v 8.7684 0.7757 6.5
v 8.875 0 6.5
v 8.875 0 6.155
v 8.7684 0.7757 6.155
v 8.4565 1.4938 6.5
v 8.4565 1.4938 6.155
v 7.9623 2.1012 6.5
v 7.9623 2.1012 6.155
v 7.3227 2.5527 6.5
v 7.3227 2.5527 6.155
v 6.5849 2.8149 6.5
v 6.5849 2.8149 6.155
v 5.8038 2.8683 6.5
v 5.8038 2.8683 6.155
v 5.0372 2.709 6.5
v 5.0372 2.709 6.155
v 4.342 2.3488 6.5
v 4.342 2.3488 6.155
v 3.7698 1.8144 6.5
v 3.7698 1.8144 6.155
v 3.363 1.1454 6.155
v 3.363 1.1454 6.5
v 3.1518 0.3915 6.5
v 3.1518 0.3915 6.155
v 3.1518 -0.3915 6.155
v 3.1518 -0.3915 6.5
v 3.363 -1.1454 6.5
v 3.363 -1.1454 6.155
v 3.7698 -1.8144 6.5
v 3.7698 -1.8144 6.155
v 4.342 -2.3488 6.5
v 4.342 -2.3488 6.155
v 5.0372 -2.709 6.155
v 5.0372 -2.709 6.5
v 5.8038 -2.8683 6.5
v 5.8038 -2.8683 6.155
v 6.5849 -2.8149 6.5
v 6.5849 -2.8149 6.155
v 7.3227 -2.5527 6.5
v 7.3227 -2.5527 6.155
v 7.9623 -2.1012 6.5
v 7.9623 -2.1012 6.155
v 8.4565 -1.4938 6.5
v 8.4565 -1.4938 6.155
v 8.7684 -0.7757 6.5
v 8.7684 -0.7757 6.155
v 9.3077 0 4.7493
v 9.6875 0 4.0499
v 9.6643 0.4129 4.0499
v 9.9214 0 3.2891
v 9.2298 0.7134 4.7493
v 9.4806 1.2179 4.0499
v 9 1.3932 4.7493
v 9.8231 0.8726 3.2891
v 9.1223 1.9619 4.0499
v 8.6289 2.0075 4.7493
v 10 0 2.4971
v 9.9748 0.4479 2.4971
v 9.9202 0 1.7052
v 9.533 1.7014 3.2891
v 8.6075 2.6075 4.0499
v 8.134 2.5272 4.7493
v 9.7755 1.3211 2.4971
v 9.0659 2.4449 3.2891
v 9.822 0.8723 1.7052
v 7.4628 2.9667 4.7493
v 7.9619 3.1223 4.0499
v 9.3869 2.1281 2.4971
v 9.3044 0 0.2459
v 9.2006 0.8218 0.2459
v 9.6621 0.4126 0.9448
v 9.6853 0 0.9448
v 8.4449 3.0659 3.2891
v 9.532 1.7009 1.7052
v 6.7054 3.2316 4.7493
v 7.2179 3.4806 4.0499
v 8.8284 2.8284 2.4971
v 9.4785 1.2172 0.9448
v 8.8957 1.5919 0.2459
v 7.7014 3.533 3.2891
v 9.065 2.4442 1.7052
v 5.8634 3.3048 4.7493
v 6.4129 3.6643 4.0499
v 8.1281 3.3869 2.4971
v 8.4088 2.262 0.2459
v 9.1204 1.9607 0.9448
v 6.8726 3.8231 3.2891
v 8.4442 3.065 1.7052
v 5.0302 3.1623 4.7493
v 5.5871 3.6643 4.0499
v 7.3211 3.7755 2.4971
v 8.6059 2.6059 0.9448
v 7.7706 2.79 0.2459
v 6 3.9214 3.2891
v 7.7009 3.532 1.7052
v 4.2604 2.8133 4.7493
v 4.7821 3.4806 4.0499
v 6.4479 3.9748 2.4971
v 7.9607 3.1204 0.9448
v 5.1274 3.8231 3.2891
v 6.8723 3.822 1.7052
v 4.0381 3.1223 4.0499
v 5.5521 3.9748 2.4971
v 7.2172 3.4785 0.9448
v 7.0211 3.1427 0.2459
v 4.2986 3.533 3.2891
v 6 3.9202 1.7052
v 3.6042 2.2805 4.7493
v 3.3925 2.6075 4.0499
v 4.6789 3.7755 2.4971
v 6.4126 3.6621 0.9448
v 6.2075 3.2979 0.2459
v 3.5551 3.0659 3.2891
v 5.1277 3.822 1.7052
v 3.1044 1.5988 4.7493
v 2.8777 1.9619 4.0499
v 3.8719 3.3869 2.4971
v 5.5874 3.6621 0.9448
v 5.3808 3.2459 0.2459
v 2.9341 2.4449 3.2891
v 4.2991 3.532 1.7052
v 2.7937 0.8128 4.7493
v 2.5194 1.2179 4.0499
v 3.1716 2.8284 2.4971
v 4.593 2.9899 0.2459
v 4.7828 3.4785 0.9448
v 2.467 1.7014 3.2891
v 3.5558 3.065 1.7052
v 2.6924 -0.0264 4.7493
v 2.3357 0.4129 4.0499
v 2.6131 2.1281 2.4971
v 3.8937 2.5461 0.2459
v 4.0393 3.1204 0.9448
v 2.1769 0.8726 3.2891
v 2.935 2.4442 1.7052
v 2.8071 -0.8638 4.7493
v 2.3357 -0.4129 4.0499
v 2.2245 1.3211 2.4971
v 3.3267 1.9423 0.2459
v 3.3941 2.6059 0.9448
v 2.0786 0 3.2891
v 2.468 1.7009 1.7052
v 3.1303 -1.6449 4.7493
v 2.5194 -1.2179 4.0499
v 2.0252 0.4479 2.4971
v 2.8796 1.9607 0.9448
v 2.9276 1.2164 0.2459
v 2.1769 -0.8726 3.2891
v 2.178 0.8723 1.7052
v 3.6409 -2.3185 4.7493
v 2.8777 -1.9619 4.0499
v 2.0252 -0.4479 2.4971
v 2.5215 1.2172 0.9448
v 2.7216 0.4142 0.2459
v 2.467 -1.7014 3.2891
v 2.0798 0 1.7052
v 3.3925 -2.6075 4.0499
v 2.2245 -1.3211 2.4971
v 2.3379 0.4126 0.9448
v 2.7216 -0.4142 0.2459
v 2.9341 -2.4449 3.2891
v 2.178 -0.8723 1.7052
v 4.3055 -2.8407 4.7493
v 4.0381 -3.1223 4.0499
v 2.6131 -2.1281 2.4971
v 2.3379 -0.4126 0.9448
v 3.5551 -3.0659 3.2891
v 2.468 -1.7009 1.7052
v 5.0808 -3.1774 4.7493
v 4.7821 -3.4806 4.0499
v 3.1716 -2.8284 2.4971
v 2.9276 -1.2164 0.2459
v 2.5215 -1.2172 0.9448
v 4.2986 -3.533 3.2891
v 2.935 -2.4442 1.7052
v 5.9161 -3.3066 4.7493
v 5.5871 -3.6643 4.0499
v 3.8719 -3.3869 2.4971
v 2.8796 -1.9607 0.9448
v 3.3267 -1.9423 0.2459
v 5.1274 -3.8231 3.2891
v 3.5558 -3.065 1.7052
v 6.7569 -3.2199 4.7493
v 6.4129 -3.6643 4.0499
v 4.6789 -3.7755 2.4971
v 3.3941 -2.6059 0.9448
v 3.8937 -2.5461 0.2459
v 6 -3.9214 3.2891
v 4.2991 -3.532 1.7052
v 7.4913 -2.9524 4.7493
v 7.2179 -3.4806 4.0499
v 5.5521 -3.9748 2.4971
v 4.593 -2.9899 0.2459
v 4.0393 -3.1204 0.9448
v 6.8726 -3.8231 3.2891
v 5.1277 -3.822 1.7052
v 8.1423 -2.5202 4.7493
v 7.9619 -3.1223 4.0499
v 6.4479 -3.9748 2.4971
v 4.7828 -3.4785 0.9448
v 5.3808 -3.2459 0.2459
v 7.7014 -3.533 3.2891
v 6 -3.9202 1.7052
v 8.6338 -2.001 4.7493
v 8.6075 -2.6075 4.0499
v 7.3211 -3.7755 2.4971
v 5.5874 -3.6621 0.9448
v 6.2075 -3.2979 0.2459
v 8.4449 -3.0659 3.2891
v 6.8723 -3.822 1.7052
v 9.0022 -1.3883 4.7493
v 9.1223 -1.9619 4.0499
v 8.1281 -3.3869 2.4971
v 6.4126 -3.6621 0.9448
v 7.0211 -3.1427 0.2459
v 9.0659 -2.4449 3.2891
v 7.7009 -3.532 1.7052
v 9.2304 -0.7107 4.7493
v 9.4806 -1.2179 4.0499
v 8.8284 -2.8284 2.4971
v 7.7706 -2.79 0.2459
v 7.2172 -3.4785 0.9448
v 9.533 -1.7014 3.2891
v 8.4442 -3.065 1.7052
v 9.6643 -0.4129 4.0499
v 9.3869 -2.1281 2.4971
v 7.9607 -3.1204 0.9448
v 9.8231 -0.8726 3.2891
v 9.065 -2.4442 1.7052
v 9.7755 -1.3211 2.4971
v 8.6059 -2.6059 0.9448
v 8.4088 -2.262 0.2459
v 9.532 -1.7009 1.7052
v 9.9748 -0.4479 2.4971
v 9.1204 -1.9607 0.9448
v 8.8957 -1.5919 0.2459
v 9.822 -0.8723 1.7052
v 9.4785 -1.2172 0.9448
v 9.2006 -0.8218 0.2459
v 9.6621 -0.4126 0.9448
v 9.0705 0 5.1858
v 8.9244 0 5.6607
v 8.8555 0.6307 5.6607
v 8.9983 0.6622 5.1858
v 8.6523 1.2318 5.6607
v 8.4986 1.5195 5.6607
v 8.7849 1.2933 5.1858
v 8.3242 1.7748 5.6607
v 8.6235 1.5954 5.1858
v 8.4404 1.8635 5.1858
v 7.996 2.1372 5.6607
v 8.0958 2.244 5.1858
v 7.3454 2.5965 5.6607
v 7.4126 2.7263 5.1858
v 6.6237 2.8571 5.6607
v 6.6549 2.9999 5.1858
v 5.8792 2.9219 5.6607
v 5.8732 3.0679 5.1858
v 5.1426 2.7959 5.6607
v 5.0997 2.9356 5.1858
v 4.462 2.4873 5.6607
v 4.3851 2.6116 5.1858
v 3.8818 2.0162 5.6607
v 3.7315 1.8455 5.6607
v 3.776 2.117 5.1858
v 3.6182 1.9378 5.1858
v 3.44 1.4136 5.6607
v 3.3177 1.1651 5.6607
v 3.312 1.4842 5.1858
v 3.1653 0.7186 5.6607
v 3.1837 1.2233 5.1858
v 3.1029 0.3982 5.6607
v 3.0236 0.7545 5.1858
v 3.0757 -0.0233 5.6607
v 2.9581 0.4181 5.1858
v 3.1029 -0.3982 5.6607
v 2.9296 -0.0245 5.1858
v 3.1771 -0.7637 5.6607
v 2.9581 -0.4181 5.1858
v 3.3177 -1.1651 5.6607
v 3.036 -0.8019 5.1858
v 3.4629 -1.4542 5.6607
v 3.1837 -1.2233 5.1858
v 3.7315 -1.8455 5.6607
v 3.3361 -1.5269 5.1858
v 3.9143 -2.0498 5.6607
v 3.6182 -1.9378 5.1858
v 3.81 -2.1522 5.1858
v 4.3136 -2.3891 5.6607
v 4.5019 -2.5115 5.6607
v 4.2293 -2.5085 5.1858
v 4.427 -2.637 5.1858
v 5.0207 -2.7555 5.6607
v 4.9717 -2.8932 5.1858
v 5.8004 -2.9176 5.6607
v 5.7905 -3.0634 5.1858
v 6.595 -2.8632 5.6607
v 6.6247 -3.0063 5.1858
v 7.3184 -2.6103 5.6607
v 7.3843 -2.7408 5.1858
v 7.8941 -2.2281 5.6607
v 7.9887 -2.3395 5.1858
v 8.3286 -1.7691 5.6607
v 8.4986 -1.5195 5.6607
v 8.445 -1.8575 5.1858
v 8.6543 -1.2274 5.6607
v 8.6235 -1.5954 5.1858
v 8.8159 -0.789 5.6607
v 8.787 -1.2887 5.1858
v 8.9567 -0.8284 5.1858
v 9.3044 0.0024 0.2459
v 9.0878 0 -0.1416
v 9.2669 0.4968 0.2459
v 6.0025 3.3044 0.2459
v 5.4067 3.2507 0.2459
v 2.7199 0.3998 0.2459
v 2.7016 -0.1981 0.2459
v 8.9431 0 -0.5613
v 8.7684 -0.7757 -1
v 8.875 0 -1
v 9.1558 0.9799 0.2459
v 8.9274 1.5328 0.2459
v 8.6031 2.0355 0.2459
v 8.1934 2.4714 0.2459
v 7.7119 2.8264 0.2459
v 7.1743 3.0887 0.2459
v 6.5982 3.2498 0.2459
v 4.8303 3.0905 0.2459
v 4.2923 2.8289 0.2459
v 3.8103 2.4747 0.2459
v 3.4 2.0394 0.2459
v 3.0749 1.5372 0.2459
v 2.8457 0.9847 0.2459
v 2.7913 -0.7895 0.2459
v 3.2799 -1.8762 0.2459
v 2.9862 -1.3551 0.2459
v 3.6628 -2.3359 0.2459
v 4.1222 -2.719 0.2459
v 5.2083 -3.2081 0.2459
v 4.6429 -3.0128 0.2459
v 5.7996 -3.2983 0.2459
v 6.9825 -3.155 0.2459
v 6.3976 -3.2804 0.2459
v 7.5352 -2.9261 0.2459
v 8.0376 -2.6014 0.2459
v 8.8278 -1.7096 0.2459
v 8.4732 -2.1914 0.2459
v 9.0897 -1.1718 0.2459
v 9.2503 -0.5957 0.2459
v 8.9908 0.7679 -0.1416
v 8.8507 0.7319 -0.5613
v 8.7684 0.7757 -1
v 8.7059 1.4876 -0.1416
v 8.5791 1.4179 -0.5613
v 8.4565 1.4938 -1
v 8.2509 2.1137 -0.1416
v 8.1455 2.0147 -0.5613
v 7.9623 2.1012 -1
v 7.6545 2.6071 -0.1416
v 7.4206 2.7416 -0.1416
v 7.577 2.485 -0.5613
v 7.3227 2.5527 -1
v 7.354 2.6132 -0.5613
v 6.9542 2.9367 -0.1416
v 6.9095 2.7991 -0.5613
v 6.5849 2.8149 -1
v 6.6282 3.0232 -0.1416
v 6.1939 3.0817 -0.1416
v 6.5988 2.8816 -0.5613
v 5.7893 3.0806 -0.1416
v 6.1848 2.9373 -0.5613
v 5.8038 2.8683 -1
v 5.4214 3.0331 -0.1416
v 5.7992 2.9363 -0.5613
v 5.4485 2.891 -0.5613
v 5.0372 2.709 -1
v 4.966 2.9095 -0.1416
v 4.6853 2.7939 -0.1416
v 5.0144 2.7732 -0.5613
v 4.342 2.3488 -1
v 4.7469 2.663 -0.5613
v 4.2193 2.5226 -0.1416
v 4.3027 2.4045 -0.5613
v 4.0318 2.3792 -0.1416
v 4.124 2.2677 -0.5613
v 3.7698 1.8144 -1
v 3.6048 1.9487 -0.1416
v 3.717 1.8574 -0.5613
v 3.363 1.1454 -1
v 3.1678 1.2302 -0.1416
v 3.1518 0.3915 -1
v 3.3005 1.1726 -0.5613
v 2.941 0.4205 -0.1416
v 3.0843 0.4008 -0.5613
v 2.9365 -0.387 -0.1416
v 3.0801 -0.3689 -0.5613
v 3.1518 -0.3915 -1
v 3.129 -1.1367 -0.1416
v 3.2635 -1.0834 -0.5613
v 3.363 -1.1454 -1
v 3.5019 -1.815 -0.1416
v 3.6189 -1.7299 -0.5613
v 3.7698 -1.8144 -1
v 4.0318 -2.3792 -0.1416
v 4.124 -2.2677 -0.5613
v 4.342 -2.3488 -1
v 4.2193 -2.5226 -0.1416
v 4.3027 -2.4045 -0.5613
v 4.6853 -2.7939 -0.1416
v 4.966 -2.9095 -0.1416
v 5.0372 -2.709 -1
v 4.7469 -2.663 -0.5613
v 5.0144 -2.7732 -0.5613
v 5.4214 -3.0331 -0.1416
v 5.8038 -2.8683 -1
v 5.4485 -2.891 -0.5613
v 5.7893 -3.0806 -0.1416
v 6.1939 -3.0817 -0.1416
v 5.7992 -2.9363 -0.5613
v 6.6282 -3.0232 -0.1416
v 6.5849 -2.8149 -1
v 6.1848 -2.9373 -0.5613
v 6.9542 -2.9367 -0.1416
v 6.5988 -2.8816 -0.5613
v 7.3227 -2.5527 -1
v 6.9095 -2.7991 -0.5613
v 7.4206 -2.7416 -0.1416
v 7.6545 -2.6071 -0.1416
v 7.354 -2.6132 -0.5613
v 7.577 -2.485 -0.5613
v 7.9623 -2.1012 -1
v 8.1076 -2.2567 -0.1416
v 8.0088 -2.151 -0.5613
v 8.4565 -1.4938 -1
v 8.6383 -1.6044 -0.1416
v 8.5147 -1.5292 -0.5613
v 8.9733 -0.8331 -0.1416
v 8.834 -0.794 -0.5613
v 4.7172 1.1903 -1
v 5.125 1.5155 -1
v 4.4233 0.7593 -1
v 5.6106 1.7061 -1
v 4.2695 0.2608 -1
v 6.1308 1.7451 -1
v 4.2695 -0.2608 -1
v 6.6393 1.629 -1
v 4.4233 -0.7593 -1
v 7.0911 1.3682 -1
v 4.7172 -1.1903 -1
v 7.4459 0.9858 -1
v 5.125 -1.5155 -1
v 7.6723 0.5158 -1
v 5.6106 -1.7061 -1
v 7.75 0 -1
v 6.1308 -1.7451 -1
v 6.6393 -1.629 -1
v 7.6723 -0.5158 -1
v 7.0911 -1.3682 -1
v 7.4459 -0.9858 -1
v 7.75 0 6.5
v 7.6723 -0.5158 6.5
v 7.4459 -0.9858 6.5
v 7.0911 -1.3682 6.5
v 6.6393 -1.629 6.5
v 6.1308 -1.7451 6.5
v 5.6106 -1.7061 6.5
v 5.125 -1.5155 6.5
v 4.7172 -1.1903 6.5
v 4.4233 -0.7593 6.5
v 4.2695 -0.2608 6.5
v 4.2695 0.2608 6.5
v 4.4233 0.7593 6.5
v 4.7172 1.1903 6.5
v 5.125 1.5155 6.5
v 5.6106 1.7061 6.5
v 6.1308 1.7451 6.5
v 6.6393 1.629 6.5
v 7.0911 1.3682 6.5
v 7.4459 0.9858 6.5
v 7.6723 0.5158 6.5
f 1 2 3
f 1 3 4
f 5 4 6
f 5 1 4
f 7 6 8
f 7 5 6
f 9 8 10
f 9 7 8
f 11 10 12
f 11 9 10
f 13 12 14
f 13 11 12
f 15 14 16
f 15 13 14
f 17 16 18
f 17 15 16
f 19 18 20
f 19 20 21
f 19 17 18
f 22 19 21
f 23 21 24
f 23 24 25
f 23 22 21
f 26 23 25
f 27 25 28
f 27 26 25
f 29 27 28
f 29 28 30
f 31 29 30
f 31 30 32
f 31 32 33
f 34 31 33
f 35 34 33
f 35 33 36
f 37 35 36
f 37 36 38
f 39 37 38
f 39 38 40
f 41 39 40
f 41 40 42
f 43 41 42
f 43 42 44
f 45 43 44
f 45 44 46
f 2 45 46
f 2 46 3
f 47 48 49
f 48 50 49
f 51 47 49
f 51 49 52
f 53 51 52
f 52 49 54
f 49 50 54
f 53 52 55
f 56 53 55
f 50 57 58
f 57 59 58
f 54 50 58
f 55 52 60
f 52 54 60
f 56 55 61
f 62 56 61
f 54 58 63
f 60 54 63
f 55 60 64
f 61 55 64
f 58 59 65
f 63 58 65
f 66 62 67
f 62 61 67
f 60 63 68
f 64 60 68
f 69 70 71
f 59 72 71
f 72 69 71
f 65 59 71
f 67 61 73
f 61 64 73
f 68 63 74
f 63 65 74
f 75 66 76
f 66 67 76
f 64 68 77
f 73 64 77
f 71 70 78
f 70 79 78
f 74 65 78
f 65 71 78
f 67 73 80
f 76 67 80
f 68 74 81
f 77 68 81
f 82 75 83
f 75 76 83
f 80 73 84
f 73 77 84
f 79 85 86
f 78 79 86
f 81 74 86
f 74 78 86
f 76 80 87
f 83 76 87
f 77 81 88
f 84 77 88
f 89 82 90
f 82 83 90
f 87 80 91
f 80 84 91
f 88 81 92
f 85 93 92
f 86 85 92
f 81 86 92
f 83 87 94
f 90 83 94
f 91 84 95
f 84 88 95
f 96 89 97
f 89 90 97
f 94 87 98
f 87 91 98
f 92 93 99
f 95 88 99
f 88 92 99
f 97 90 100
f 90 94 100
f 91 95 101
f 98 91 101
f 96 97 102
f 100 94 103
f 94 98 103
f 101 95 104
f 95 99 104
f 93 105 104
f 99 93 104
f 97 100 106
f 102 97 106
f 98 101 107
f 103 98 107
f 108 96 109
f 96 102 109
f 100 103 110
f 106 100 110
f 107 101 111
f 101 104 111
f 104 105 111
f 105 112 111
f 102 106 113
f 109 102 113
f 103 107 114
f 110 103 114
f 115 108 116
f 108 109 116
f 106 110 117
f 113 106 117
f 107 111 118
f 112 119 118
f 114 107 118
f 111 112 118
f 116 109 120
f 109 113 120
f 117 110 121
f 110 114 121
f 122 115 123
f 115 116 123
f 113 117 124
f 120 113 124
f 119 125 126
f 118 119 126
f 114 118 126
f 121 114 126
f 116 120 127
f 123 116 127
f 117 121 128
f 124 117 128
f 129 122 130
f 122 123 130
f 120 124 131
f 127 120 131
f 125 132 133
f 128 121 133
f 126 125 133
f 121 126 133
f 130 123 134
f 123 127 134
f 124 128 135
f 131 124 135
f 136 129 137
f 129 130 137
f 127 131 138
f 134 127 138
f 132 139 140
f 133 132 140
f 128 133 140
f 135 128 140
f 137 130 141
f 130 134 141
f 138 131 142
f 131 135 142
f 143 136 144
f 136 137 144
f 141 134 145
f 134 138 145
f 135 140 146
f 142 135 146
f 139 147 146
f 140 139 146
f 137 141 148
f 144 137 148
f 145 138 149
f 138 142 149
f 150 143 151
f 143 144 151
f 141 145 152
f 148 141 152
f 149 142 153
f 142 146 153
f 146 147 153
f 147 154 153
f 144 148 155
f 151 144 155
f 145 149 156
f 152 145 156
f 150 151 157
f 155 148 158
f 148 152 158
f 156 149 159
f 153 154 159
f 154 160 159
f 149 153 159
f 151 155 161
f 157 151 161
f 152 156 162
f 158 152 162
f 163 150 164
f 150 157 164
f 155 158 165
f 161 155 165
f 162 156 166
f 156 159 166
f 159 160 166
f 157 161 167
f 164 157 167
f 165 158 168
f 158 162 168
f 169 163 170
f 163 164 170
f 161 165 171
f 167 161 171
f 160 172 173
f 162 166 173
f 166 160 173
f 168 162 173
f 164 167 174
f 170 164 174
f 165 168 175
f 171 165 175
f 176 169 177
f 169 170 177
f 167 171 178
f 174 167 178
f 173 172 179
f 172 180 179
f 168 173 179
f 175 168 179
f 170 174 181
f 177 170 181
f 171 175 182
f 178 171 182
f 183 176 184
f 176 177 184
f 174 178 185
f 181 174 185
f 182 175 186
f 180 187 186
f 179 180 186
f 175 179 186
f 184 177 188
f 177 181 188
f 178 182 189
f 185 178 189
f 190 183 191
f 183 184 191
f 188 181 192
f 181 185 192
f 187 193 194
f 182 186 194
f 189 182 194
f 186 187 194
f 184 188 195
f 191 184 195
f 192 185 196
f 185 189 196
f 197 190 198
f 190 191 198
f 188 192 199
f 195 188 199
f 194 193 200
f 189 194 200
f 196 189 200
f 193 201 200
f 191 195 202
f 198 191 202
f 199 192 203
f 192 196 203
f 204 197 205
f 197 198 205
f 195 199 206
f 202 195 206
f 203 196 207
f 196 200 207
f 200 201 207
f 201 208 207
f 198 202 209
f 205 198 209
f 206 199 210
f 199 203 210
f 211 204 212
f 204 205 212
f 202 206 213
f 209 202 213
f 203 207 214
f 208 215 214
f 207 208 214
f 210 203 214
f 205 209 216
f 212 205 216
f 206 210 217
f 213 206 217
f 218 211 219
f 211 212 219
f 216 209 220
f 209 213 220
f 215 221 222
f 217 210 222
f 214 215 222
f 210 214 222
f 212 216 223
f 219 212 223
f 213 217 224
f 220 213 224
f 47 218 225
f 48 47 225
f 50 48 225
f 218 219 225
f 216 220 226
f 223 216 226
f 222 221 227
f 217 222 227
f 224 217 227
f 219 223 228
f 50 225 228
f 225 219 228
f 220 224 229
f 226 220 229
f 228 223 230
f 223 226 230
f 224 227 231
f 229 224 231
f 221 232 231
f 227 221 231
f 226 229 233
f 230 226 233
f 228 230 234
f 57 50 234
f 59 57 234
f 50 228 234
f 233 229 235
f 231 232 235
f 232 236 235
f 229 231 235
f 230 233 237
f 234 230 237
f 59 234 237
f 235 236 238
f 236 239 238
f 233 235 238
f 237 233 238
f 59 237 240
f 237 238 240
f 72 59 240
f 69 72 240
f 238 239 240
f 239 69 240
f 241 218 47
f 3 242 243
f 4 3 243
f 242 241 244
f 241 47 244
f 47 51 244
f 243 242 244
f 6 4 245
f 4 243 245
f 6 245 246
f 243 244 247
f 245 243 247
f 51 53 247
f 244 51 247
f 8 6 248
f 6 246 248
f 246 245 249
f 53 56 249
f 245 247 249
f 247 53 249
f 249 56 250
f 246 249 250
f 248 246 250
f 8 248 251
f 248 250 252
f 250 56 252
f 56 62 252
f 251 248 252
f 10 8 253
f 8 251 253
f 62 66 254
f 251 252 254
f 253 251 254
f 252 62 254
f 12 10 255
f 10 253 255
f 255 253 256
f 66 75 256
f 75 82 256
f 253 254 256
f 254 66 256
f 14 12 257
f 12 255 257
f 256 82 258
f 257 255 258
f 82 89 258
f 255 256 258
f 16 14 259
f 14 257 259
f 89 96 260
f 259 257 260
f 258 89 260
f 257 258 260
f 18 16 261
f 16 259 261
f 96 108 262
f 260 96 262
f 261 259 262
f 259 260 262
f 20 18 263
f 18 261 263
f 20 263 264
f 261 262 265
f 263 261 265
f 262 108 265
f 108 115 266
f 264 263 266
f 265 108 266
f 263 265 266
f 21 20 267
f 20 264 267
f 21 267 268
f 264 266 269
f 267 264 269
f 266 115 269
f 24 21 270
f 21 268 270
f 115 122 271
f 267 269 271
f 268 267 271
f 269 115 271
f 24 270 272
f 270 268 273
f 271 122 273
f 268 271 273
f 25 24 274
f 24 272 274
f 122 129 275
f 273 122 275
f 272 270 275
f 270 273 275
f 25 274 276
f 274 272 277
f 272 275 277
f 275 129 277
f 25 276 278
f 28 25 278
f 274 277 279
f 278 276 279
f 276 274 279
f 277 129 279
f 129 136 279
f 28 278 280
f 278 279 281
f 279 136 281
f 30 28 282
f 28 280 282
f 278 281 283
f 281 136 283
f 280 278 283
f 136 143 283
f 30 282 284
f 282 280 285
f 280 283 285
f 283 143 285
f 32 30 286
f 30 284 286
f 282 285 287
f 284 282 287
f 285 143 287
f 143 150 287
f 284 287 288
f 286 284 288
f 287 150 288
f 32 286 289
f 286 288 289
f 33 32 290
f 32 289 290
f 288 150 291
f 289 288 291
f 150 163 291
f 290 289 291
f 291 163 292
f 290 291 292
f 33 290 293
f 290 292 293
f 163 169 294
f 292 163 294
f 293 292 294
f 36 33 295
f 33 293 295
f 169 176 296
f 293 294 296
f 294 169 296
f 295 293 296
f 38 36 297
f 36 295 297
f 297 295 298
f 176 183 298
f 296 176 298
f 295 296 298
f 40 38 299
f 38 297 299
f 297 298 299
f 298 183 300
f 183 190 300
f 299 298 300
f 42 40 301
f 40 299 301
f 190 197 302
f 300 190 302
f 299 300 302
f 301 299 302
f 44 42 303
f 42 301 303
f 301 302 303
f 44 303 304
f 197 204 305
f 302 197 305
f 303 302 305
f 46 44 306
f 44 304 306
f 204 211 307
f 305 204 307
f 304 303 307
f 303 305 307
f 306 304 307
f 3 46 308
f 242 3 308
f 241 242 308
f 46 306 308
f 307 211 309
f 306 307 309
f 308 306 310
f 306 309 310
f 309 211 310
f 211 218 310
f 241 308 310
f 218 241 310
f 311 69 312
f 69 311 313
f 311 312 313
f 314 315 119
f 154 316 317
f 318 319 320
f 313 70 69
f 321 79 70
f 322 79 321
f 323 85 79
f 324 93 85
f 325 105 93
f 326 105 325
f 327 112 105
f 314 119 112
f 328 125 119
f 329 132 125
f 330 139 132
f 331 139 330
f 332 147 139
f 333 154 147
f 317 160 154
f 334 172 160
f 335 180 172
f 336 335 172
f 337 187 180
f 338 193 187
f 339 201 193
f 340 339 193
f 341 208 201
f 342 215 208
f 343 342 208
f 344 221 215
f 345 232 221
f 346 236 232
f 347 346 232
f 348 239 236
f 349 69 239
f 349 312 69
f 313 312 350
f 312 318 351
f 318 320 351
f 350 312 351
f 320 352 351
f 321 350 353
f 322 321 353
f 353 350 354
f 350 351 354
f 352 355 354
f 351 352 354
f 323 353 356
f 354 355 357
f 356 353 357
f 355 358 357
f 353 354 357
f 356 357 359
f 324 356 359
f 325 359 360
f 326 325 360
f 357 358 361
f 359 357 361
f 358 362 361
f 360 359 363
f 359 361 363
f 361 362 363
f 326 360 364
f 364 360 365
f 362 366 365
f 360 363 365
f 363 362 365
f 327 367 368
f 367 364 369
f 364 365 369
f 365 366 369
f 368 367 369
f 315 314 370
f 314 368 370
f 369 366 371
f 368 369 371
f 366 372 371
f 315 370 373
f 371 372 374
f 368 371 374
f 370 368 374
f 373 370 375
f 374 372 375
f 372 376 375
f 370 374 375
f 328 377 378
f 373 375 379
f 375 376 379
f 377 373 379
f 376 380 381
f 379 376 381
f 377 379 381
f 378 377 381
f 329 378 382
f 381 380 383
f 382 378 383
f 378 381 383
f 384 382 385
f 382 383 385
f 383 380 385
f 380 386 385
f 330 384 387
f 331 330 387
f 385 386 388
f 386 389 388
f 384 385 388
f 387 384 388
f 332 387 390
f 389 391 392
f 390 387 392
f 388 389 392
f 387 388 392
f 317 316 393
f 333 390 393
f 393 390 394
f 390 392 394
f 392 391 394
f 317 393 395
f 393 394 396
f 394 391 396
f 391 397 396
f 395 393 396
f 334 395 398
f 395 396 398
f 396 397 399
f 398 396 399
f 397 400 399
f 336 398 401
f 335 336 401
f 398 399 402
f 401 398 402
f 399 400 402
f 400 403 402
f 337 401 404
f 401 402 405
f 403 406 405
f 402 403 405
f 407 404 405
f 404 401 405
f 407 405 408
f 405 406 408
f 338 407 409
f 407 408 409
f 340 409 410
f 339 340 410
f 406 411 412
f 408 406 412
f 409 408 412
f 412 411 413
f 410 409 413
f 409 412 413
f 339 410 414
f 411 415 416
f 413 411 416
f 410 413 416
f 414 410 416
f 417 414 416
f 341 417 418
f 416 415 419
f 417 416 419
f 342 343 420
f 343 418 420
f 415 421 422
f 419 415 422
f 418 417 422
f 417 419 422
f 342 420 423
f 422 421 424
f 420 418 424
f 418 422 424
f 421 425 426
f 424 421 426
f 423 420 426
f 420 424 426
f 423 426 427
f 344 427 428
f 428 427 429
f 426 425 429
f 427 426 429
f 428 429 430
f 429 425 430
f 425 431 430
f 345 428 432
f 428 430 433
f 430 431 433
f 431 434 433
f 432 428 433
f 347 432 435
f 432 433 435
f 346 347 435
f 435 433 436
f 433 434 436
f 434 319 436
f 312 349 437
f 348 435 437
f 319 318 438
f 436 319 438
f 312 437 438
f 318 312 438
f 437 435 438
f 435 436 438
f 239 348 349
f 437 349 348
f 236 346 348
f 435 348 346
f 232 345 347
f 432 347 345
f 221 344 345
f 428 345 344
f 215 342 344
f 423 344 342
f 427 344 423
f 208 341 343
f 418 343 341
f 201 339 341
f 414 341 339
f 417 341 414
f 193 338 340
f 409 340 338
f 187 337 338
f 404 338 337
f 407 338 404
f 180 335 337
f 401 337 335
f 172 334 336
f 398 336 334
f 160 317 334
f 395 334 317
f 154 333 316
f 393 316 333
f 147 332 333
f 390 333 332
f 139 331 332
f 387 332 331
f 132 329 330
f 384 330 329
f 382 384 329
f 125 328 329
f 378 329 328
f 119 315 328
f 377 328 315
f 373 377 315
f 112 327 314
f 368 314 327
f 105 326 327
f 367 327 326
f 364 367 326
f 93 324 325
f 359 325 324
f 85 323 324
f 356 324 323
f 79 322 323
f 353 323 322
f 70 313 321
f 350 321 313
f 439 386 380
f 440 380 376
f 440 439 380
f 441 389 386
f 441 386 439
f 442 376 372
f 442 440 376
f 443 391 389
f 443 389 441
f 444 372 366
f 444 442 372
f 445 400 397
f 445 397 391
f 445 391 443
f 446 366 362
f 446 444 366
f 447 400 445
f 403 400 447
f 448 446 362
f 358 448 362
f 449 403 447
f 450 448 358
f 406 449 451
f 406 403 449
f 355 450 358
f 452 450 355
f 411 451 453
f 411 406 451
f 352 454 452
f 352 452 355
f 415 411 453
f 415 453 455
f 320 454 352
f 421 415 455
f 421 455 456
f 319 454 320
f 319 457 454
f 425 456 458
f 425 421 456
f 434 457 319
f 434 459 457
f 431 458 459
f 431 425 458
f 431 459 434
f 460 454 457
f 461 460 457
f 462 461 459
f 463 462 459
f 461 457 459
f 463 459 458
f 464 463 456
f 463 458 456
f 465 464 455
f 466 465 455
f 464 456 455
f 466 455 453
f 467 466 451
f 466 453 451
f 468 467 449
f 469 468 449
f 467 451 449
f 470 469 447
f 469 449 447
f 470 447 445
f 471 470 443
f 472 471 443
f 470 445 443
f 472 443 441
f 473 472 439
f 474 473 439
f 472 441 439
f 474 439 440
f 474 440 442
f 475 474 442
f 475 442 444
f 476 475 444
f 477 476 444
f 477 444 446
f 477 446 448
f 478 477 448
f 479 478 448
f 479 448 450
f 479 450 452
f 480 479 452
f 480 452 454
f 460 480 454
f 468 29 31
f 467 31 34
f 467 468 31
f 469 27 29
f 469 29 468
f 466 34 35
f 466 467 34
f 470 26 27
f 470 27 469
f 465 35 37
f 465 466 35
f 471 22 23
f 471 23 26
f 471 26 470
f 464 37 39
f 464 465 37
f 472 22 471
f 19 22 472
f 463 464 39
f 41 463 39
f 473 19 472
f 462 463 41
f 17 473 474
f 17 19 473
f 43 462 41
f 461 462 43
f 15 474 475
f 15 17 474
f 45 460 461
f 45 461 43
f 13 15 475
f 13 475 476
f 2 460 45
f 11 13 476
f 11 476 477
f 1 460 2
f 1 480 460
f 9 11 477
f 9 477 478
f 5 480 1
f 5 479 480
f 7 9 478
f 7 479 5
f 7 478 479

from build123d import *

# Parameters (mm, degrees)
SKETCH2_R           = 2.875
BOSS_EXTRUDE1_DEPTH = 0.71892557
BOSS_EXTRUDE2_START = 1.218925567
SKETCH3_R           = 2.875
BOSS_EXTRUDE2_DEPTH = 1.218925567
SKETCH4_R           = 1.75
CUT_EXTRUDE1_DEPTH  = 14.12440475
FILLET1_R           = 2.5


with BuildPart() as part:
    # Sketch1 → Revolve1 (revolve)
    with BuildSketch(Plane(origin=(0, 0, 0), x_dir=(1, 0, 0), z_dir=(0, 1, 0))):
        with BuildLine():
            Line((8.875, 0.281074433), (6, 0.281074433))
            Line((6, 0.281074433), (6, -5.281074433))
            Line((6, -5.281074433), (8.875, -5.281074433))
            ThreePointArc((8.875, -5.281074433), (10, -2.5), (8.875, 0.281074433))
        make_face()
    revolve(axis=Axis((6, 0, -0.281074433), (0, 0, 1)))

    # Sketch2 → Boss-Extrude1 (add)
    with BuildSketch(Plane(origin=(0, 0, -0.281074433), x_dir=(-1, 0, 0), z_dir=(0, 0, -1))):
        with Locations(Location((-6, 0, 0), (0, 0, 180))):
            Circle(SKETCH2_R)
    extrude(amount=BOSS_EXTRUDE1_DEPTH)

    # Sketch3 → Boss-Extrude2 (add)
    with BuildSketch(Plane.XY.offset(5.281074433).offset(BOSS_EXTRUDE2_START)):
        with Locations((6, 0)):
            Circle(SKETCH3_R)
    extrude(amount=-BOSS_EXTRUDE2_DEPTH)

    # Sketch4 → Cut-Extrude1 (cut, through all)
    with BuildSketch(Plane(origin=(0, 0, -1.000000003), x_dir=(-1, 0, 0), z_dir=(0, 0, -1))):
        with Locations(Location((-6, 0, 0), (0, 0, 180))):
            Circle(SKETCH4_R)
    extrude(amount=-CUT_EXTRUDE1_DEPTH, mode=Mode.SUBTRACT)

    # Fillet1
    # the kernel refuses this fillet: 2.5 mm, written as the material it adds along each edge
    with BuildSketch(Plane(origin=(6, 0, 5.281074433), x_dir=(1, 0, 0), z_dir=(0, -1, 0))) as fillet1_piece_1:
        with BuildLine():
            CenterArc((5.375, 0.873973447), FILLET1_R, 180, 34.216051131)
            Line((2.875, 0.873973447), (2.825, 0.873973447))
            Line((2.825, 0.873973447), (2.825, 0))
            Line((2.825, 0), (2.8390625, -0.03476343))
            ThreePointArc((2.8390625, -0.03476343), (3.063976775, -0.288175252), (3.266346154, -0.559929952))
            Line((3.266346154, -0.559929952), (3.307692308, -0.531814199))
        make_face()
    revolve(axis=Axis((6, 0, 5.281074433), (0, 0, 1)))
    with BuildSketch(Plane(origin=(6, 0, -0.281074433), x_dir=(1, 0, 0), z_dir=(0, -1, 0))) as fillet1_piece_2:
        with BuildLine():
            CenterArc((5.369690775, -0.881768859), FILLET1_R, 145.700811221, 30.56445132)
            Line((2.875, -0.71892557), (2.825106184, -0.715668704))
            ThreePointArc((2.825106184, -0.715668704), (2.825, -0.359462785), (2.825, 0))
            Line((2.825, 0), (2.8390625, 0.03476343))
            ThreePointArc((2.8390625, 0.03476343), (3.062167338, 0.285952954), (3.263119779, 0.55519274))
            Line((3.263119779, 0.55519274), (3.304425092, 0.527017022))
        make_face()
    revolve(axis=Axis((6, 0, -0.281074433), (0, 0, 1)))


solid = part.part
